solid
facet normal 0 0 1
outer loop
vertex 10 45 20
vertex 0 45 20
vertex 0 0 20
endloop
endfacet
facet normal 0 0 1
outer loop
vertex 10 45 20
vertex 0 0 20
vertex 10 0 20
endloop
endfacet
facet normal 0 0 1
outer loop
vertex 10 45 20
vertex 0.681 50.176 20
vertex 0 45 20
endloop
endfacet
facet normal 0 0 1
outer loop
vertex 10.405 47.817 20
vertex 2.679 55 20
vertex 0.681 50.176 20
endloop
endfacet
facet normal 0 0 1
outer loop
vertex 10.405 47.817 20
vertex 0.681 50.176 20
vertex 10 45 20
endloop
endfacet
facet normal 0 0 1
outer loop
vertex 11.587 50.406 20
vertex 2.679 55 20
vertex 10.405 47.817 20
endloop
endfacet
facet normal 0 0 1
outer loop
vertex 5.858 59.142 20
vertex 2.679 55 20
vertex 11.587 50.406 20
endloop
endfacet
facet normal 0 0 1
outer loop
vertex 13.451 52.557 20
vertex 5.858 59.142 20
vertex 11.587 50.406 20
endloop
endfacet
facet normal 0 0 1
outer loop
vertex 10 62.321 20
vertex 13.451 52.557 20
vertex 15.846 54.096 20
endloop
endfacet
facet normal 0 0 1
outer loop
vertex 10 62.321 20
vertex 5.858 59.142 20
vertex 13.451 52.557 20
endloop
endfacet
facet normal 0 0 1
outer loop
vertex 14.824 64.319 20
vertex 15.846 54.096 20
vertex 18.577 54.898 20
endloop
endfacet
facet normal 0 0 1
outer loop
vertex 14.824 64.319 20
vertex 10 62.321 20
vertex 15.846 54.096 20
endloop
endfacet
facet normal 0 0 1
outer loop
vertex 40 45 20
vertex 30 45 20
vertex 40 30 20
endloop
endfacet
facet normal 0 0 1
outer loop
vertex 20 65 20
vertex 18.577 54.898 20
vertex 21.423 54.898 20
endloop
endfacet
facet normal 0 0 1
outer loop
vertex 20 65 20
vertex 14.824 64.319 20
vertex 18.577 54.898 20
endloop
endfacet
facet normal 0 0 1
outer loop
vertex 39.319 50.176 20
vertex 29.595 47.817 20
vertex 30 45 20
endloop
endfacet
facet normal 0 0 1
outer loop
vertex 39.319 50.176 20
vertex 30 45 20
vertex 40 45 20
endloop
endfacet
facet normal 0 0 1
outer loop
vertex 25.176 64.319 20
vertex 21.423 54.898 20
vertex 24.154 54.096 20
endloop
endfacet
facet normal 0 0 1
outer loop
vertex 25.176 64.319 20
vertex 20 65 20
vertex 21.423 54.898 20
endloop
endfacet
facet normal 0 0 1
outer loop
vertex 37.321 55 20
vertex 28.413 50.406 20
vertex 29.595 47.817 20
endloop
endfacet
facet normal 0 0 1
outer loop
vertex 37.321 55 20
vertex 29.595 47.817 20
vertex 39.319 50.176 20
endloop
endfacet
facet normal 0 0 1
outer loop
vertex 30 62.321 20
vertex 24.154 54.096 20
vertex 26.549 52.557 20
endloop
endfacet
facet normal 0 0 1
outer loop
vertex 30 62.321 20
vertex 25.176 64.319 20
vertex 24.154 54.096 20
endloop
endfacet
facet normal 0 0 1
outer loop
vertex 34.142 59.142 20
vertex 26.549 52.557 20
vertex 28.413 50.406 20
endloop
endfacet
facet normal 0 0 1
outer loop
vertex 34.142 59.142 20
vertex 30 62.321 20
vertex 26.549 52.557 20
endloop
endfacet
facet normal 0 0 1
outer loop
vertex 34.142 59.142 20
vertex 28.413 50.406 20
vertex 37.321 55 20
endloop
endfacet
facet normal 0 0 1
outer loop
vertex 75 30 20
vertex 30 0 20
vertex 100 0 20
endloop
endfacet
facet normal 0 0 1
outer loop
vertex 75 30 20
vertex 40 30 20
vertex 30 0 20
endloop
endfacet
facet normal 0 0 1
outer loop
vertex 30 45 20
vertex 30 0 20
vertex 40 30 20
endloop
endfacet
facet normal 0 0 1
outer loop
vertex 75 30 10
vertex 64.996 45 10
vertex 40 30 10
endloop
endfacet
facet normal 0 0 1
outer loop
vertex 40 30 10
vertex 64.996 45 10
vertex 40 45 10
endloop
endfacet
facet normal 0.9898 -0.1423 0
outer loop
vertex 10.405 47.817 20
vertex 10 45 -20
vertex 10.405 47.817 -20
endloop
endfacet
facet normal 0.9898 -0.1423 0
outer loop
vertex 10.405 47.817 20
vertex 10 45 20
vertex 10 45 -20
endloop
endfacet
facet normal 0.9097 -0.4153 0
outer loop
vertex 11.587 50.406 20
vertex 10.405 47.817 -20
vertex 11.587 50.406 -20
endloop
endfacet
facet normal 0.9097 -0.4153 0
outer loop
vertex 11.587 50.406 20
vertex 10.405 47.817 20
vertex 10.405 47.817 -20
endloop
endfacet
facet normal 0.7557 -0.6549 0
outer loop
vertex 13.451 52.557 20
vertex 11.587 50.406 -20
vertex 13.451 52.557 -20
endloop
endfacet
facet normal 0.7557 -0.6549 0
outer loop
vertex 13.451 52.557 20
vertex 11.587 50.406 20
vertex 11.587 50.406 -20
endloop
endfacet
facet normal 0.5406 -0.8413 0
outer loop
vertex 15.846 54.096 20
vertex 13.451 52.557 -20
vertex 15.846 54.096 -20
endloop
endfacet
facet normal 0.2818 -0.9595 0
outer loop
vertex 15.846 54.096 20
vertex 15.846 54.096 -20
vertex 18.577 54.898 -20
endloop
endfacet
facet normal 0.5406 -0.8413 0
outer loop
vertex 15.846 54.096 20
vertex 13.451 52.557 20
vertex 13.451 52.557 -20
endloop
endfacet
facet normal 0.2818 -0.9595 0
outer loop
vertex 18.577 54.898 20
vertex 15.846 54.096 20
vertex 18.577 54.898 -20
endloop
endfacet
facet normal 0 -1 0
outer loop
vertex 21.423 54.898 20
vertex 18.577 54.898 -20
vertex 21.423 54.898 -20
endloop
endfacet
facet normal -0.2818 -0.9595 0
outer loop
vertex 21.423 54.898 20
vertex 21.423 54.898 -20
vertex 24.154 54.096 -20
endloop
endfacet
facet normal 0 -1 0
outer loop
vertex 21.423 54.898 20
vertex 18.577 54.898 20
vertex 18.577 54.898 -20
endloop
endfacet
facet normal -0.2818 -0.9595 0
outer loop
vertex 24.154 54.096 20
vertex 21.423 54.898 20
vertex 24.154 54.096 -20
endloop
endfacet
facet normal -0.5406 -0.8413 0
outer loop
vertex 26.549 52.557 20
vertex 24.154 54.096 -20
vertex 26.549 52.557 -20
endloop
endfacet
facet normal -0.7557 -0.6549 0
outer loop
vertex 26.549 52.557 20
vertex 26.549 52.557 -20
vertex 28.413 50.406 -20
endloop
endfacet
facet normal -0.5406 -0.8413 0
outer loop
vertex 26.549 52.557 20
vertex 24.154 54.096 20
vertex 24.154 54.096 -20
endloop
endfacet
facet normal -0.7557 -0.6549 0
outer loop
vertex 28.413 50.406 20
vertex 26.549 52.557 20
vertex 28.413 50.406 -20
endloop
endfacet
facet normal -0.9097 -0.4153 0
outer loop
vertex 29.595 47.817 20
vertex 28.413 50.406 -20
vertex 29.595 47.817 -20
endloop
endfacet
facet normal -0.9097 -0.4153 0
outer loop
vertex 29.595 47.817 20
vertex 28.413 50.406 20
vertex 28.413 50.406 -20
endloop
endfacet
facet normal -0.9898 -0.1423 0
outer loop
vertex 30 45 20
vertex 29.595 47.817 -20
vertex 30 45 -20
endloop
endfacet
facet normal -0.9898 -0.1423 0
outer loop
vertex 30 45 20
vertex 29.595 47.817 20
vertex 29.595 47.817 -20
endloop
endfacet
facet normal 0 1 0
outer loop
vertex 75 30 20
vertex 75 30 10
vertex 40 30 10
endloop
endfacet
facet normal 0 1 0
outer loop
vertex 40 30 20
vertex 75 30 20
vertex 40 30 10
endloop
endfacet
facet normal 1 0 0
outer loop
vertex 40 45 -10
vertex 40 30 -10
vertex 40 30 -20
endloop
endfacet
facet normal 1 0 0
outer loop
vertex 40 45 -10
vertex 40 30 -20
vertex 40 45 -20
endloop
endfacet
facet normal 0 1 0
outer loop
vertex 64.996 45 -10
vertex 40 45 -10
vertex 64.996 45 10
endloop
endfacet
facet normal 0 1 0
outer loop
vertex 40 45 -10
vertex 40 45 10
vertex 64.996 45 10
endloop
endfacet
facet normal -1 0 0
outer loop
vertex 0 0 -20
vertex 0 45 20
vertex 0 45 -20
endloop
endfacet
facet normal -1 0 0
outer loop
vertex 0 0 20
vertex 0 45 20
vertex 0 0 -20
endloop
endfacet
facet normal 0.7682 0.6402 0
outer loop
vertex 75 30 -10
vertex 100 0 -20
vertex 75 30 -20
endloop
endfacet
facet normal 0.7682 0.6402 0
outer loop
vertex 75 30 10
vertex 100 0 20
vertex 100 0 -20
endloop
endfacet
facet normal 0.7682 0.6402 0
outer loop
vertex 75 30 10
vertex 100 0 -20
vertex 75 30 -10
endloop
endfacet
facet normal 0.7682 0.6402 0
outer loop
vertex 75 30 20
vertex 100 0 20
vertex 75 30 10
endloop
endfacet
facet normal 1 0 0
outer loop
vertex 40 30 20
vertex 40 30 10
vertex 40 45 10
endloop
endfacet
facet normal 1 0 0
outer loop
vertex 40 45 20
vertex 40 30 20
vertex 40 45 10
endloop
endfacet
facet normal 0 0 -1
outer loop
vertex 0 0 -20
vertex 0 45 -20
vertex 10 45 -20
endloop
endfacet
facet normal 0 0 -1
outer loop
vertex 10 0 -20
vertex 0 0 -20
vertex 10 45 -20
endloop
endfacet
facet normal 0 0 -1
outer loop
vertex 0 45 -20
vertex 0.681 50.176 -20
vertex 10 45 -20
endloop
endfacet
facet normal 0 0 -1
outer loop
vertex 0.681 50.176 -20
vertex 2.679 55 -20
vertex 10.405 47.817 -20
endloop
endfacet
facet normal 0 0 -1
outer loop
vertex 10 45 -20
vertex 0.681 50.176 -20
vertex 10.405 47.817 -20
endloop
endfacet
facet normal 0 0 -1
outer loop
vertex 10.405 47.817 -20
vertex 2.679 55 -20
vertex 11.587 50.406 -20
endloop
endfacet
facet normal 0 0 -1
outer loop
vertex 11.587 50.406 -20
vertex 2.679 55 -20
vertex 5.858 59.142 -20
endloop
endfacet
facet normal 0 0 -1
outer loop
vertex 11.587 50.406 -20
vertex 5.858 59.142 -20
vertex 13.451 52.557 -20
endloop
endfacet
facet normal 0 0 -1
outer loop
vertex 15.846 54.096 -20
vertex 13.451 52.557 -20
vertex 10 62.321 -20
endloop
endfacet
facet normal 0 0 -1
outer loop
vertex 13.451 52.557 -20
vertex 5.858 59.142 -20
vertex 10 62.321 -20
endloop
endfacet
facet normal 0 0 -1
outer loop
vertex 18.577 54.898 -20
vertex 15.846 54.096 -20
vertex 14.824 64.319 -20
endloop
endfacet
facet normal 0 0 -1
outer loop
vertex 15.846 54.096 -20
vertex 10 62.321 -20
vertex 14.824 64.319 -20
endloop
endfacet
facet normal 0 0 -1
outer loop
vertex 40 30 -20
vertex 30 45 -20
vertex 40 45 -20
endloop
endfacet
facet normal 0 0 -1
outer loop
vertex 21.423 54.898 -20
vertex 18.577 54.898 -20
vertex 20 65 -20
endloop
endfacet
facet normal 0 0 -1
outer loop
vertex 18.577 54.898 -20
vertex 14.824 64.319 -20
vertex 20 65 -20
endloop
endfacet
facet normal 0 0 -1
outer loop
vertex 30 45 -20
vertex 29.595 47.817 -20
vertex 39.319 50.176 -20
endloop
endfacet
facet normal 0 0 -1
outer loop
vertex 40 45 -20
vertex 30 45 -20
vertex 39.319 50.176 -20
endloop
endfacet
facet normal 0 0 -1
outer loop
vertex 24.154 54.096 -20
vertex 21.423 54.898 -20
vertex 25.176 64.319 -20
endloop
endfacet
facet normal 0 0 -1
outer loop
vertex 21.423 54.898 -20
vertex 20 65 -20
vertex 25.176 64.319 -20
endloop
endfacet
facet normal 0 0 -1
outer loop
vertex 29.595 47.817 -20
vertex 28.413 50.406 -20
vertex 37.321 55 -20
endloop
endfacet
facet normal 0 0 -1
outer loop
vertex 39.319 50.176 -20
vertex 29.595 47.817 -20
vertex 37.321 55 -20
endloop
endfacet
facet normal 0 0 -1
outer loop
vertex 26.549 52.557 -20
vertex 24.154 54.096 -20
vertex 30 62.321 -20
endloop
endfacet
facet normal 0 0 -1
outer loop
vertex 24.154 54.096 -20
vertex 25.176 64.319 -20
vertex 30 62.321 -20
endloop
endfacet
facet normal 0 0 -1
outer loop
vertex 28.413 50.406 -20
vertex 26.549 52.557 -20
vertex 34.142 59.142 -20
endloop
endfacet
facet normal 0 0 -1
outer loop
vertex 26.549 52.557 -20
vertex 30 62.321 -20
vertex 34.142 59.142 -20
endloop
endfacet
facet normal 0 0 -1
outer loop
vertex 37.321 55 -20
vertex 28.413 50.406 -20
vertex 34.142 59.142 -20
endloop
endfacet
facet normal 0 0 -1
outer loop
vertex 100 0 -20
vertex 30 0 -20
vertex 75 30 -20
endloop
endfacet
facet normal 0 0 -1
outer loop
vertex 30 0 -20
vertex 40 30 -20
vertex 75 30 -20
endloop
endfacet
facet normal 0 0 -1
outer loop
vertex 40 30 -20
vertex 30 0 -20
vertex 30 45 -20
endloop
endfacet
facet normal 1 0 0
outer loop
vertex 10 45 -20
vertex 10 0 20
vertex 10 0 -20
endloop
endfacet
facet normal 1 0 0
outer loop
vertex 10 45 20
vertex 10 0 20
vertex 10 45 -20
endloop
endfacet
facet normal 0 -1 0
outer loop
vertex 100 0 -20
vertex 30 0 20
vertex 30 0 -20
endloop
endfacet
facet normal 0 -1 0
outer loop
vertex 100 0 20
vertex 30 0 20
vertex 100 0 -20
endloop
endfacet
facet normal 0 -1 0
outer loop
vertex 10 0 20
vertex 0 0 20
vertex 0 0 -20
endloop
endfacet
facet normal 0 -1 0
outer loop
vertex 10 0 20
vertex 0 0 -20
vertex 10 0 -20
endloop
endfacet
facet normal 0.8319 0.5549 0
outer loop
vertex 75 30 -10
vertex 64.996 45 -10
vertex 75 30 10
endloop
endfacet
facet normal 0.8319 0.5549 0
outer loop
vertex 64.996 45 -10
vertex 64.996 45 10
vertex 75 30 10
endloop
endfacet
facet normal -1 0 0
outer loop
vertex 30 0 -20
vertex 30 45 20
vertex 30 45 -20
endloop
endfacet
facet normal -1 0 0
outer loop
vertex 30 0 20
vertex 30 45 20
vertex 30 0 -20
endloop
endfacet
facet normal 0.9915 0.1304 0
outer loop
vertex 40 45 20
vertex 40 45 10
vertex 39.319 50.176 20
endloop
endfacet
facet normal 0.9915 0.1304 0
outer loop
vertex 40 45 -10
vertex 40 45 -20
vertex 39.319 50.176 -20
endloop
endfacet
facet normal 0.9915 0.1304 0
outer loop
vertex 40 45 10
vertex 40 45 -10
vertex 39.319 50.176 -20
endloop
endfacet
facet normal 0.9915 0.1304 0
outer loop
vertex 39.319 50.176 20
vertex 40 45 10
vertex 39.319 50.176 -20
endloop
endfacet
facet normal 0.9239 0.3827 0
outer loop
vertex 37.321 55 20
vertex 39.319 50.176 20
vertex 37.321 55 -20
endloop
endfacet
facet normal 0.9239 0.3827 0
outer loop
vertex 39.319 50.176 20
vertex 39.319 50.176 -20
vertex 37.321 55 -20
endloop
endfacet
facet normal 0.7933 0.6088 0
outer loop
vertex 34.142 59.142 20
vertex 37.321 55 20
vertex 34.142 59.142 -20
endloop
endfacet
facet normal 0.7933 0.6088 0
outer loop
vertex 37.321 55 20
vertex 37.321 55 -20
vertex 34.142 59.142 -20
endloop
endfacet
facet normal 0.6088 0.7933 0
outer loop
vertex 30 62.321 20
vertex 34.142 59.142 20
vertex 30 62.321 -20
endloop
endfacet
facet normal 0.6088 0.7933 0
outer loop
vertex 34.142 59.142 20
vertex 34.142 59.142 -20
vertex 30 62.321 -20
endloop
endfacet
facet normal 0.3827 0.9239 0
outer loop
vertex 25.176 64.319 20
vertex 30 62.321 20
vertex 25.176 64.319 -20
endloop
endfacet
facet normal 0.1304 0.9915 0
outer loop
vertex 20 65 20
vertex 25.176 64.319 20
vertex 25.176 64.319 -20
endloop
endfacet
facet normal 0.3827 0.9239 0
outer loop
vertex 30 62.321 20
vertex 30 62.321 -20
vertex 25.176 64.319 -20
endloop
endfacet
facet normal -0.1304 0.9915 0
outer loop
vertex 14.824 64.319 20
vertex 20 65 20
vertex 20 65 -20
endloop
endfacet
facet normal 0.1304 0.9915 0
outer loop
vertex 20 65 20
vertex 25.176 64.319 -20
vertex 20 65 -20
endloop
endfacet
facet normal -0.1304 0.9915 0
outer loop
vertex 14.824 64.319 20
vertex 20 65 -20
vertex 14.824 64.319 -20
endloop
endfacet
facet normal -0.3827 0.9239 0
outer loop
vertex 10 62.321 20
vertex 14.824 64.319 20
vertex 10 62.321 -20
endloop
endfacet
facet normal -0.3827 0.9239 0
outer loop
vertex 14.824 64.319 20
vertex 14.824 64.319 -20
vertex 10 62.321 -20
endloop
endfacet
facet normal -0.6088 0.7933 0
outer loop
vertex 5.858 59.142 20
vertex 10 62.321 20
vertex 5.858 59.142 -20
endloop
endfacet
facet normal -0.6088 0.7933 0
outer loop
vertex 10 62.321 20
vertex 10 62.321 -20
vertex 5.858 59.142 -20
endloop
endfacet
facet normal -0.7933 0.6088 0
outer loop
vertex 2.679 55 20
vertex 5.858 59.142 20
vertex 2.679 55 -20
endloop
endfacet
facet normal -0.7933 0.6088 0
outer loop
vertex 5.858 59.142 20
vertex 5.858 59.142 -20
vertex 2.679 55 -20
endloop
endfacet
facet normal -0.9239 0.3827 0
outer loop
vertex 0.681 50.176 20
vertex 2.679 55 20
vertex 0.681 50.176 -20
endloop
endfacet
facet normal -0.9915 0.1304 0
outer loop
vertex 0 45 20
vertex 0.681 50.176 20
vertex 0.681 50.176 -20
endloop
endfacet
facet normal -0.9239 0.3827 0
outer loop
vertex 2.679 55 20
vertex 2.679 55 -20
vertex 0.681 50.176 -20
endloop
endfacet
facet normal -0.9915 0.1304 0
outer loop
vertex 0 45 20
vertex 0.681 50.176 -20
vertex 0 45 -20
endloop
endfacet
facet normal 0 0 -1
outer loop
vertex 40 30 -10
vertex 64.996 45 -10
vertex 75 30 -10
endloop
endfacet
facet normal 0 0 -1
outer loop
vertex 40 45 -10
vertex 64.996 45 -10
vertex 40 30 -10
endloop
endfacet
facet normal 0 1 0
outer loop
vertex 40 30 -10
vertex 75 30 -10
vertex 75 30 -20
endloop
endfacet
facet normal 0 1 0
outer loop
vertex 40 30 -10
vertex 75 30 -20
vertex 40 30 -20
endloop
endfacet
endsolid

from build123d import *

# Parameters (mm, degrees)
BOSS_EXTRUDE1_DEPTH = 20
BOSS_EXTRUDE2_DEPTH = 10
CUT_EXTRUDE1_DEPTH  = 20


with BuildPart() as part:
    # Sketch1 → Boss-Extrude1 (new body, symmetric)
    with BuildSketch(Plane.XY):
        with BuildLine():
            Line((0, 0), (100, 0))
            Line((100, 0), (75, 30))
            Line((75, 30), (40, 30))
            Line((40, 30), (40, 45))
            ThreePointArc((40, 45), (34.142135624, 59.142135624), (20, 65))
            ThreePointArc((20, 65), (5.857864376, 59.142135624), (0, 45))
            Line((0, 45), (0, 0))
        make_face()
    extrude(amount=BOSS_EXTRUDE1_DEPTH, both=True)

    # Sketch2 → Boss-Extrude2 (add, symmetric)
    with BuildSketch(Plane.XY):
        Polygon((40, 30), (40, 45), (64.995844506, 45), (75, 30), align=None)
    extrude(amount=BOSS_EXTRUDE2_DEPTH, both=True)

    # Sketch3 → Cut-Extrude1 (cut, symmetric)
    with BuildSketch(Plane.XY):
        with BuildLine():
            Line((10, 0), (10, 45))
            ThreePointArc((10, 45), (20, 55), (30, 45))
            Line((30, 45), (30, 0))
            Line((30, 0), (10, 0))
        make_face()
    extrude(amount=CUT_EXTRUDE1_DEPTH, both=True, mode=Mode.SUBTRACT)


solid = part.part
